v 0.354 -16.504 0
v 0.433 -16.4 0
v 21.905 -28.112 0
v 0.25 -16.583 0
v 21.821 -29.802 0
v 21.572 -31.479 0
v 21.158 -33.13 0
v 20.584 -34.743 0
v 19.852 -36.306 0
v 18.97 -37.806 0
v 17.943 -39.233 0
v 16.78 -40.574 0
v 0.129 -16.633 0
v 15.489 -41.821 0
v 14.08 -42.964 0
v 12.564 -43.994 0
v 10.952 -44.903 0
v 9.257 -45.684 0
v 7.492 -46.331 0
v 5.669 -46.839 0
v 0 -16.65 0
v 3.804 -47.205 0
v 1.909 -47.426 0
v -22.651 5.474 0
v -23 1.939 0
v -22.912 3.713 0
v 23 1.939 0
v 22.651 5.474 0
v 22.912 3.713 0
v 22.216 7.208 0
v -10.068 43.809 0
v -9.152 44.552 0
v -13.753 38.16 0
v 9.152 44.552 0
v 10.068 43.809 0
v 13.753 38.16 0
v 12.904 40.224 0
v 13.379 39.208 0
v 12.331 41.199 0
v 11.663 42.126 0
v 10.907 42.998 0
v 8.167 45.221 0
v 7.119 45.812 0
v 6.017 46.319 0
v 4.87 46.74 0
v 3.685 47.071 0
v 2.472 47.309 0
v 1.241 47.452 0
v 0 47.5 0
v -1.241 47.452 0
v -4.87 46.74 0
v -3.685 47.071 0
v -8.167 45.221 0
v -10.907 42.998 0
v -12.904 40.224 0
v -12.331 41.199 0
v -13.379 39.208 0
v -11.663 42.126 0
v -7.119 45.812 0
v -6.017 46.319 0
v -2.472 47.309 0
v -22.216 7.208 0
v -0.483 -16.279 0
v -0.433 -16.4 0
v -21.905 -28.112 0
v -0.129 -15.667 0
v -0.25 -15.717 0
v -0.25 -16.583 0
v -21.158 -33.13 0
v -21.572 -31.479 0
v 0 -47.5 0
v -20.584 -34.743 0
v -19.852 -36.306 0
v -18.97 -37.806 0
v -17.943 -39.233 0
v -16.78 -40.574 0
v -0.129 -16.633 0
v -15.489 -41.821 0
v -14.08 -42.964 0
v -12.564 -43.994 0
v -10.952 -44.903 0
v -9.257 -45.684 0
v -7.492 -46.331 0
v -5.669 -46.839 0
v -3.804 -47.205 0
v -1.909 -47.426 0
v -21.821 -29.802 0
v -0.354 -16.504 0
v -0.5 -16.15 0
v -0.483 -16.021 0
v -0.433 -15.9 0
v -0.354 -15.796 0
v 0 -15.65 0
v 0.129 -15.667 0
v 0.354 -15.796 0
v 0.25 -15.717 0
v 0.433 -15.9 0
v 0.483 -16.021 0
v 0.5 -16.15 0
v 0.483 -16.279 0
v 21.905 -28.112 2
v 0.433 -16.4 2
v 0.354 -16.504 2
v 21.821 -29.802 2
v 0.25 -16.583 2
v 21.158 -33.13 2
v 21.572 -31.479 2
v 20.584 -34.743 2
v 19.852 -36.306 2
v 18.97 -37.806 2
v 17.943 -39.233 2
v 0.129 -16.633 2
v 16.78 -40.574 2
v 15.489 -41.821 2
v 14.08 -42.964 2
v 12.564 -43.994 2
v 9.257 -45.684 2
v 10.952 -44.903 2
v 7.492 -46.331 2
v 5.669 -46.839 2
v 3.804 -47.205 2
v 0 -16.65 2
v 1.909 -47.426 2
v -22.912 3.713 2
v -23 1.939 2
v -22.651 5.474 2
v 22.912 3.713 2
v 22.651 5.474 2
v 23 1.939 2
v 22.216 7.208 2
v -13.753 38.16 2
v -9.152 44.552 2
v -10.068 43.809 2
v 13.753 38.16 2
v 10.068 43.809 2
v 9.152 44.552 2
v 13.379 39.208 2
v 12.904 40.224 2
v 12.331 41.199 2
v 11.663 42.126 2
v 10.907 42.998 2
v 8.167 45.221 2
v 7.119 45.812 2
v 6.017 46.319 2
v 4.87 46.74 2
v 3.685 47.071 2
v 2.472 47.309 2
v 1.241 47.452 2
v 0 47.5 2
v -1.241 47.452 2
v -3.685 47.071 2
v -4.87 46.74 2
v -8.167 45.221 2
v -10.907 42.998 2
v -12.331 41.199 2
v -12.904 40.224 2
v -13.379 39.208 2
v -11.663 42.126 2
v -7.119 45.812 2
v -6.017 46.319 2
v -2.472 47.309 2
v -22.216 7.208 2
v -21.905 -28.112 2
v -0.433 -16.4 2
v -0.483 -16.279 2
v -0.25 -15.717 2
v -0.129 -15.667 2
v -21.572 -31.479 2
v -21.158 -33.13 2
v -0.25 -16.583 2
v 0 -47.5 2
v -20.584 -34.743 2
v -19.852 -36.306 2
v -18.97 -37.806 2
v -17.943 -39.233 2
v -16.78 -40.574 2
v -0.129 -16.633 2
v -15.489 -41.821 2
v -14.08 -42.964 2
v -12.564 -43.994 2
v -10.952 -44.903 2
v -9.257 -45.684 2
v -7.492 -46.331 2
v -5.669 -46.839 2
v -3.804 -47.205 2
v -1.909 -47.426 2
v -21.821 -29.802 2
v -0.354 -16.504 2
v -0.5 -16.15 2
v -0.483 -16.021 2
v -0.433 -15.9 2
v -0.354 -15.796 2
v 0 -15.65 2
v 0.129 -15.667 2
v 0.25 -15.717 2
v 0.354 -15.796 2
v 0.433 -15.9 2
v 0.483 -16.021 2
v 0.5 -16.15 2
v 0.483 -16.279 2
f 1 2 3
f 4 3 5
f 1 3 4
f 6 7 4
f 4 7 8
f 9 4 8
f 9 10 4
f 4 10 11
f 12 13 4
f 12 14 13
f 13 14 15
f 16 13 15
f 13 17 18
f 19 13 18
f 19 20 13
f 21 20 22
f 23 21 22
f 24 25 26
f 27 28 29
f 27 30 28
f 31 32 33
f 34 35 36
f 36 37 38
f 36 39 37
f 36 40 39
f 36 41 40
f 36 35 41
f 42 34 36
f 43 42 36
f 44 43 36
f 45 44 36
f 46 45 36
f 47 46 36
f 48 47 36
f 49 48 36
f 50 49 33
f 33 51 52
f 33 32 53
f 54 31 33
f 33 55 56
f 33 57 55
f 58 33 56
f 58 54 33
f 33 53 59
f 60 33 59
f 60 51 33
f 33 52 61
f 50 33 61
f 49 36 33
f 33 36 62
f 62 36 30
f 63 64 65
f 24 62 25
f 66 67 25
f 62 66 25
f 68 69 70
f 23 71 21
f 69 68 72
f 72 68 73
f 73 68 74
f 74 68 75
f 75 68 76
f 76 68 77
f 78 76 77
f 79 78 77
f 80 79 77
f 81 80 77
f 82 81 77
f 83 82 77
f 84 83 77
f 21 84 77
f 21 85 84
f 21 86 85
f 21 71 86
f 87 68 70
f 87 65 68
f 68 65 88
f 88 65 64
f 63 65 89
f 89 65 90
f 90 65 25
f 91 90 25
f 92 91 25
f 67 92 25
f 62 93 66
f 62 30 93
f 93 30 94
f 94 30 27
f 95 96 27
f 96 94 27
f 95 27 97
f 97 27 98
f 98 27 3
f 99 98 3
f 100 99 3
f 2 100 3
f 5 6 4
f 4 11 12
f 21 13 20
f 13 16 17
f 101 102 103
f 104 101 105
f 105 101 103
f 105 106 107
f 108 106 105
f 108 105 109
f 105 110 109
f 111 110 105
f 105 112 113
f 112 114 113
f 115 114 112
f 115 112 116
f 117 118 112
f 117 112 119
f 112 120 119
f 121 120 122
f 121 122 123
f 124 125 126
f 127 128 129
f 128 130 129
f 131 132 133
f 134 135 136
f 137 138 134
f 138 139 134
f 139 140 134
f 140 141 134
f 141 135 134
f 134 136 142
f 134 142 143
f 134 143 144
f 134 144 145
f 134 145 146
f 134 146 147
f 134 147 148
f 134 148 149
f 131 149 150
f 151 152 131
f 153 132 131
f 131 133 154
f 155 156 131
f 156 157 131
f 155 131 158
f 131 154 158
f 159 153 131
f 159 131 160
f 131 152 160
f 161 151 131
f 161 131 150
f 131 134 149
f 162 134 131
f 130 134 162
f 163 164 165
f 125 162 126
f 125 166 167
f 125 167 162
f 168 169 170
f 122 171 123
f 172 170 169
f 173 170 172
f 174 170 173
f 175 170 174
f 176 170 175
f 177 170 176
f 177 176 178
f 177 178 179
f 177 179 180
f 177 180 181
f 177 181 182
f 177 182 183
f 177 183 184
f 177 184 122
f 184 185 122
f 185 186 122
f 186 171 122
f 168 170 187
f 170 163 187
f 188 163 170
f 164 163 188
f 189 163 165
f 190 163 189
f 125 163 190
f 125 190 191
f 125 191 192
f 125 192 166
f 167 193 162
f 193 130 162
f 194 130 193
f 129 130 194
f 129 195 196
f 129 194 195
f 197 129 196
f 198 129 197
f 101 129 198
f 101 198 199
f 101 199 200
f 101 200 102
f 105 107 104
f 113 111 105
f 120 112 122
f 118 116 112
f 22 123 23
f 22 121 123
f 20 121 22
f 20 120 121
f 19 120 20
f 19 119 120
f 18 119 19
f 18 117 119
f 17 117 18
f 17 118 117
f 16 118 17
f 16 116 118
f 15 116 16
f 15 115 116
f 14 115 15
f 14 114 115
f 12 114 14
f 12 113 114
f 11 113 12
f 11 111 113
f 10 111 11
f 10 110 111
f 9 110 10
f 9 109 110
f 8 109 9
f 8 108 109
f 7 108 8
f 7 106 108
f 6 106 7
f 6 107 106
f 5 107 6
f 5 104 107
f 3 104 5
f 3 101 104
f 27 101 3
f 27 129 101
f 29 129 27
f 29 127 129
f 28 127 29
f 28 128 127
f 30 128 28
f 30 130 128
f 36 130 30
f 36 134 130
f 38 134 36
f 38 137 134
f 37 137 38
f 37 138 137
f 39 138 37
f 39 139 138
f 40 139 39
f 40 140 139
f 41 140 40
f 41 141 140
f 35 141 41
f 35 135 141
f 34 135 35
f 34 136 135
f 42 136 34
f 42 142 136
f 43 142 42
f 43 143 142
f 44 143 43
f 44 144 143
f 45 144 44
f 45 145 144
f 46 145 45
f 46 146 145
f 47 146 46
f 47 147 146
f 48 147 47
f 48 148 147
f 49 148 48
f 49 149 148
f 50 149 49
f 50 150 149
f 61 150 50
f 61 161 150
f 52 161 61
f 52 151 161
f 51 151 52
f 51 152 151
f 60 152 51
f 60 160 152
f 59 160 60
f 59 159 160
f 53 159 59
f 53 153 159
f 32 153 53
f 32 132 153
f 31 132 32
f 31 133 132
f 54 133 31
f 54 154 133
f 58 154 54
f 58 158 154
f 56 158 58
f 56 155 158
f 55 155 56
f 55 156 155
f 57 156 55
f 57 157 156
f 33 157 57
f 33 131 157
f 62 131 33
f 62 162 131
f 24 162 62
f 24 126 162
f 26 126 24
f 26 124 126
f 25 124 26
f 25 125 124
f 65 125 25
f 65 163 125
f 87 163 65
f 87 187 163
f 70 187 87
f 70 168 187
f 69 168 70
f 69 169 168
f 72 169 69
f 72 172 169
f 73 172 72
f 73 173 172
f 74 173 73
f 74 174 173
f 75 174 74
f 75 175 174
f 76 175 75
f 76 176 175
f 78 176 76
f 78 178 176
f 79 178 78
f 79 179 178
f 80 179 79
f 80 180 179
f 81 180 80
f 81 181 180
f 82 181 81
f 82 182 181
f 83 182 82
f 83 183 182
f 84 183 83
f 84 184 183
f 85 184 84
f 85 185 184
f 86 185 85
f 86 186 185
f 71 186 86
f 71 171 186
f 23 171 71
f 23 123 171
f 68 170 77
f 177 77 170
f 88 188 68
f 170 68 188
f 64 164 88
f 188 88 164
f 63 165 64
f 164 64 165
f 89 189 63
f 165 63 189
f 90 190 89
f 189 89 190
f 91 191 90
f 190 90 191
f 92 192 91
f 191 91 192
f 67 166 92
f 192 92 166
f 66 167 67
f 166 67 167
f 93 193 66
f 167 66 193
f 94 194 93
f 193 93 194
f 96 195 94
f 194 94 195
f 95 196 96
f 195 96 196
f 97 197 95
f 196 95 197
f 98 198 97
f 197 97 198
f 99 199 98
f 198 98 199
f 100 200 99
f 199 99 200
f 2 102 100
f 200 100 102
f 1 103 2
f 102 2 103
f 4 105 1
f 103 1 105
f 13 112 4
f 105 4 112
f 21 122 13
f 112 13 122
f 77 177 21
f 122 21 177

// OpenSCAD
/*
Caloric vintage gas range | PHOTO-BASED TEST KIT | v1.0 | Oct 2026
Author: OpenAI for personal restoration prototyping
UNVERIFIED DIMENSIONS: photographs do not establish a scale. Test all fit offline.
Printed parts are NON-STRUCTURAL PROTOTYPES, not oven/gas-rated parts.
DO NOT install prototype as load-bearing handle mount, on running/hot stove,
or use printed parts in a gas path, inside hot cavities, or over a vent.
All measurements in millimeters.
*/
PART = "profile";
L = 95;                // overall tapered ivory end-piece height
W = 46;                // overall tapered ivory end-piece width
THICKNESS = 2.0;
CENTER_HOLE = 18;
HOLE_X = 0;
HOLE_Y_FRAC = -0.17;
RIM = 1.8;
LIP_HEIGHT = 2.0;
FIT_CLEARANCE = 0.25;
$fn = 72;

module end_footprint(){
  scale([W/42,L/98])
  hull(){
    translate([0,36]) circle(r=13);
    translate([0,2]) circle(r=21);
    translate([0,-29]) circle(r=20);
  }
}
module profile(){
  linear_extrude(height=THICKNESS)
    difference(){ end_footprint(); translate([HOLE_X,HOLE_Y_FRAC*L]) circle(d=1.0, $fn=24); }
}
module plate(){
  linear_extrude(height=THICKNESS)
    difference(){
      end_footprint();
      translate([HOLE_X,HOLE_Y_FRAC*L]) circle(d=CENTER_HOLE);
    }
}
module shell(){
  difference(){
    union(){
      linear_extrude(height=THICKNESS) end_footprint();
      translate([0,0,THICKNESS])
      linear_extrude(height=LIP_HEIGHT)
        difference(){ end_footprint(); offset(delta=-RIM) end_footprint(); }
      for (s=[-1,1]){
        translate([s*W*0.19,L*0.07,THICKNESS])
          cube([2.1,13,1.15],center=true);
      }
    }
    translate([HOLE_X,HOLE_Y_FRAC*L,-0.1])
      cylinder(d=CENTER_HOLE,h=THICKNESS+LIP_HEIGHT+0.3);
  }
}
module rounded_box_2d(w,h,r){
  hull(){
    for(x=[-w/2+r,w/2-r], y=[-h/2+r,h/2-r])
      translate([x,y]) circle(r=r);
  }
}
module emboss_label(str,x,y,fontsize=3.6,z=3){
  translate([x,y,z]) linear_extrude(0.55)
    text(str,size=fontsize,halign="center",valign="center",font="Liberation Sans:style=Bold");
}
module boss_gauge(){
  ds = [14,16,18,20,22];
  difference(){
    linear_extrude(3) rounded_box_2d(164,39,4);
    for(i=[0:4]) translate([-64+i*32,4,-0.1]) cylinder(d=ds[i],h=3.2);
  }
  for(i=[0:4]) emboss_label(str(ds[i]),-64+i*32,-14,4.0,3);
}
module chrome_gauge(){
  widths=[18,22,26,30];
  difference(){
    linear_extrude(3) rounded_box_2d(142,38,3);
    for(i=[0:3]) translate([-54+i*36,13,1.5])
      cube([widths[i],18,3.4],center=true);
  }
  for(i=[0:3]) emboss_label(str(widths[i]),-54+i*36,-13,4.5,3);
}
module screw_washers(){
  ds=[5,6,8,10];
  for(i=[0:3]){
    translate([(i-1.5)*32,0,0]) difference(){
      union(){
        cylinder(d=26,h=3);
        translate([0,0,3]) cylinder(d1=26,d2=23,h=1);
      }
      translate([0,0,-.2]) cylinder(d=ds[i],h=4.4);
    }
  }
}
module keyhole_gauge(){
  ds=[7,9,11,13];
  for(i=[0:3]){
    translate([(i-1.5)*31,0,0]){
      union(){
        linear_extrude(3) hull(){
          translate([0,-11]) circle(r=7);
          translate([0,1]) circle(r=5);
        }
        translate([0,3,3]) cylinder(d=ds[i],h=2);
        emboss_label(str(ds[i]),0,-11,4,3);
      }
    }
  }
}
module decorative_trim_sample(){
  union(){
    linear_extrude(2) rounded_box_2d(100,14,2);
    translate([0,0,2])
      linear_extrude(2) rounded_box_2d(98,8,3);
    translate([0,0,4])
      linear_extrude(1.1) rounded_box_2d(96,2,1);
  }
}
module knob_shaft_gauge(){
  ds=[5,5.5,6,6.5,7];
  difference(){
    linear_extrude(3) rounded_box_2d(145,30,3);
    for (i=[0:4]){
      translate([-56+i*28,4,-0.1])
        cylinder(d=ds[i],h=3.2,$fn=80);
    }
  }
  for(i=[0:4]) emboss_label(str(ds[i]),-56+i*28,-9,3.9,3);
}
// First-print combined bed layout: every item is a separate loose gauge.
module first_print_layout(){
  translate([-76,70,0]) let(L=85,W=41) profile();
  translate([-10,70,0]) let(L=95,W=46) profile();
  translate([63,70,0]) let(L=105,W=51) profile();
  translate([0,-8,0]) boss_gauge();
  translate([0,-59,0]) chrome_gauge();
  translate([0,-102,0]) keyhole_gauge();
}
if (PART=="profile") profile();
else if (PART=="plate") plate();
else if (PART=="shell") shell();
else if (PART=="boss_gauge") boss_gauge();
else if (PART=="chrome_gauge") chrome_gauge();
else if (PART=="screw_washers") screw_washers();
else if (PART=="keyhole_gauge") keyhole_gauge();
else if (PART=="decorative_trim_sample") decorative_trim_sample();
else if (PART=="knob_shaft_gauge") knob_shaft_gauge();
else if (PART=="first_print_layout") first_print_layout();
else assert(false,str("Unsupported PART: ", PART));
